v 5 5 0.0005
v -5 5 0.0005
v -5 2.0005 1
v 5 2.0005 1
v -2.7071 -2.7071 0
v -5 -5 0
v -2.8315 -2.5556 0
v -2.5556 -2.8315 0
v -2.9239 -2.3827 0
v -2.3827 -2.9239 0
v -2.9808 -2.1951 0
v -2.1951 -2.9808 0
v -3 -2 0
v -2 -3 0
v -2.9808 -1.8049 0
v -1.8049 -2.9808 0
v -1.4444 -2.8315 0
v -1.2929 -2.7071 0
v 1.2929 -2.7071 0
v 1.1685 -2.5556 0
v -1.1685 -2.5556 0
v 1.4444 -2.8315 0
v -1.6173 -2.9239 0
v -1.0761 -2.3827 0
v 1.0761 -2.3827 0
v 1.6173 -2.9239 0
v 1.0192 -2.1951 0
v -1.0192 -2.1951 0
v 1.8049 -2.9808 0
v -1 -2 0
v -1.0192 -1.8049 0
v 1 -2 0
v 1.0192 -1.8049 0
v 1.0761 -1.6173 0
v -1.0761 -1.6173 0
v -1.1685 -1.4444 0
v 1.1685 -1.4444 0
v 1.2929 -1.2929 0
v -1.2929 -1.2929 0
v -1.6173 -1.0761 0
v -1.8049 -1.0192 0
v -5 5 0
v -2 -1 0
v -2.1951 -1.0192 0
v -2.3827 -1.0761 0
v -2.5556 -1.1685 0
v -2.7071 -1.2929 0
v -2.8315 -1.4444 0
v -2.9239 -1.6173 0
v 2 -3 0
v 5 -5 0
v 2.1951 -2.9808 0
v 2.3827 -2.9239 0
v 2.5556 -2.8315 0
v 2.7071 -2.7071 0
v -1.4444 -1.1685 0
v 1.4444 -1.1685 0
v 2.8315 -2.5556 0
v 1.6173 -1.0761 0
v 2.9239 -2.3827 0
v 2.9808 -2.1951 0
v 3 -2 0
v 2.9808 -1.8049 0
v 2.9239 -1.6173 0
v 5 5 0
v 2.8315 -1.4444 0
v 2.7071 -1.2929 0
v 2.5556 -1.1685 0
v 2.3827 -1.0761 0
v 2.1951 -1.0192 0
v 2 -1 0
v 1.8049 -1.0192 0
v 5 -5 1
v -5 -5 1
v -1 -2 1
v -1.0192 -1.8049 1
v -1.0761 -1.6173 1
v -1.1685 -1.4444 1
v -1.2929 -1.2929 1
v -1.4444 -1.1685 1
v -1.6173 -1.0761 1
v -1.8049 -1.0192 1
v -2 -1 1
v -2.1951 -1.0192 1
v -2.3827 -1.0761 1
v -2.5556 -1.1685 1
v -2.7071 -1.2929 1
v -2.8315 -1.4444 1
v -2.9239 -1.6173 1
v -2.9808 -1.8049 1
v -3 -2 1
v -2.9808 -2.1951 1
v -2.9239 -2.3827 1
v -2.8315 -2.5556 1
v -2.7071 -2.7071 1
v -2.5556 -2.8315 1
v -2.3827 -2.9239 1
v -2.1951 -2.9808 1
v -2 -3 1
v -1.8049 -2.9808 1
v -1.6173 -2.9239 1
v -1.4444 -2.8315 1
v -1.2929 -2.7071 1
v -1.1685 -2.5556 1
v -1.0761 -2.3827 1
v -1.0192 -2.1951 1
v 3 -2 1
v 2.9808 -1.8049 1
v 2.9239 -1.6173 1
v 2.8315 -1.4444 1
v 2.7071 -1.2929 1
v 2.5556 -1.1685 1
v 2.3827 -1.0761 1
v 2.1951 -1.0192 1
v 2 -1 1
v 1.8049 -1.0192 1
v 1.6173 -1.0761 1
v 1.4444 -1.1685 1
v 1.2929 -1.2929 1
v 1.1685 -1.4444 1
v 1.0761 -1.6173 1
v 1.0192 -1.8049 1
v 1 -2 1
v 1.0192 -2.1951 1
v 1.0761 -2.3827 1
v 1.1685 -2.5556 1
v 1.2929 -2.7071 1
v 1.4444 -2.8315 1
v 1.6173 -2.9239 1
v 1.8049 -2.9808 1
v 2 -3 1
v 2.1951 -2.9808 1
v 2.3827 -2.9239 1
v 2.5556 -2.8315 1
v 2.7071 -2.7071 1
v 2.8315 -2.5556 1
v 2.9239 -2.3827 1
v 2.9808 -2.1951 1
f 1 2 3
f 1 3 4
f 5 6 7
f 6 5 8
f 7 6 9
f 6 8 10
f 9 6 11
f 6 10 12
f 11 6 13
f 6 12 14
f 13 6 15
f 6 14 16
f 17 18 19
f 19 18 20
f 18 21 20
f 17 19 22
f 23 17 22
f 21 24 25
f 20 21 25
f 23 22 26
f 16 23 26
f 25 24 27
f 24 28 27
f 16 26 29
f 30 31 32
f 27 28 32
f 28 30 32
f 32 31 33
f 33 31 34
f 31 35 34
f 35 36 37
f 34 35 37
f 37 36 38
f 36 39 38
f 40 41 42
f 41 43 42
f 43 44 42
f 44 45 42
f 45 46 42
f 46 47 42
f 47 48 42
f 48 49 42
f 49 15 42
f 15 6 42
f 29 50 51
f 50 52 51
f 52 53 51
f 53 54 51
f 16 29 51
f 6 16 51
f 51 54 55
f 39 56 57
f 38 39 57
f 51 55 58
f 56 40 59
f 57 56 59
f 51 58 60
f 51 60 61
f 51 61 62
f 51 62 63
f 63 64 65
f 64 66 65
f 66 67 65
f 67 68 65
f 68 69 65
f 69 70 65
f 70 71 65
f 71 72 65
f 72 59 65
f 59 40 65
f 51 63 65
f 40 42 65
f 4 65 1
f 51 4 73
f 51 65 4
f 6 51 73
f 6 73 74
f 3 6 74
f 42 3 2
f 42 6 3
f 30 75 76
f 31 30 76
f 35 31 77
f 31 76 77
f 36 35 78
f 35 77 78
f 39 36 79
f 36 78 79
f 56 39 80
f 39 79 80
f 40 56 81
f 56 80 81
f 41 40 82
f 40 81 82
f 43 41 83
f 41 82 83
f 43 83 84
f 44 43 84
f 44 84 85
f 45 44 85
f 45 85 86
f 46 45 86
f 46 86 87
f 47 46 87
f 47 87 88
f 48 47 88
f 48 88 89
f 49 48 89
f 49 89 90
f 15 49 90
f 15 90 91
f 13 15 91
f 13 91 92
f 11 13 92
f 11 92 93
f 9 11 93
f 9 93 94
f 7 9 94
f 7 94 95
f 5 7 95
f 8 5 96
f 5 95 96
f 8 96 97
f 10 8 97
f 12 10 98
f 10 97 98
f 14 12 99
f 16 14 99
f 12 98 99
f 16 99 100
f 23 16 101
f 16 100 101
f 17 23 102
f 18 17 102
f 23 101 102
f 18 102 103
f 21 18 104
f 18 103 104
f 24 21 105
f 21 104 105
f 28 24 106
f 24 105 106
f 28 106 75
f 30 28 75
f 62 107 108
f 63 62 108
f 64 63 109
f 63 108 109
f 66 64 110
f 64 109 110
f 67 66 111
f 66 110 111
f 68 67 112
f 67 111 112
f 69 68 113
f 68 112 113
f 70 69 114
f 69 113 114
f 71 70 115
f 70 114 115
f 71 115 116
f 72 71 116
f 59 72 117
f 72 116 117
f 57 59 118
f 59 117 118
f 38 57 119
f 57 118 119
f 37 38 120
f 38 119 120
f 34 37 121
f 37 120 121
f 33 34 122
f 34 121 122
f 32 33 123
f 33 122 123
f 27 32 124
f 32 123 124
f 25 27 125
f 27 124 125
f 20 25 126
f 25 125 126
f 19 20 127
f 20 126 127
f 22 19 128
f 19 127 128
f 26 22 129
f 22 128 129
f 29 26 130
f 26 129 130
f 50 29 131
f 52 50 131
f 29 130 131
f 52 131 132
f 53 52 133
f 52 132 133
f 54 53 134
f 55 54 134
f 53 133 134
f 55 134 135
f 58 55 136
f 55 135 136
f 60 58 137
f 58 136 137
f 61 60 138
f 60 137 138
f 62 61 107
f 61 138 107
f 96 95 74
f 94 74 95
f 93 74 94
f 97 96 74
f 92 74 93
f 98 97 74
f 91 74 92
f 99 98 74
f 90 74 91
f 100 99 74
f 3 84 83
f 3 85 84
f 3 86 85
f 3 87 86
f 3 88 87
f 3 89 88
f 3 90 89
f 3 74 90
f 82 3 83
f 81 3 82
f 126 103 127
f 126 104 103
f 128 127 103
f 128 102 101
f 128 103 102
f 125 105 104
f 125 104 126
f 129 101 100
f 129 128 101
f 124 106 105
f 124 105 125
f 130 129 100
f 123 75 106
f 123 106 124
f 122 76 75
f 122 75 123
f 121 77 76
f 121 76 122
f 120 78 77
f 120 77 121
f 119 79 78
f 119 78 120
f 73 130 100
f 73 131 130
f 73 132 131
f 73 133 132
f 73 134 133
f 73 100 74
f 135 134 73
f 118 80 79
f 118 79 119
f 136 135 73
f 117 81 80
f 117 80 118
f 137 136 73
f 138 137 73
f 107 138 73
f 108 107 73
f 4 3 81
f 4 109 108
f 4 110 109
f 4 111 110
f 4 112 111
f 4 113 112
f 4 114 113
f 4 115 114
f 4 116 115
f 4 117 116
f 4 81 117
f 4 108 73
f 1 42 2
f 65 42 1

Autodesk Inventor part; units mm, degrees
ref_plane "YZ Plane" through (0, 0, 0) normal (1, 0, 0) x (0, 1, 0)
ref_plane "XZ Plane" through (0, 0, 0) normal (0, 1, 0) x (-1, 0, 0)
ref_plane "XY Plane" through (0, 0, 0) normal (0, 0, 1) x (1, 0, 0)
sketch "スケッチ1" plane through (0, 0, 0) normal (0, 0, 1) x (1, 0, 0)
  line L0 (5, -5) -> (-5, -5)
  line L1 (-5, -5) -> (-5, 5)
  line L2 (-5, 5) -> (5, 5)
  line L3 (5, 5) -> (5, -5)
  line L4 (5, -5) -> (-5, 5) construction
  line L5 (-5, -5) -> (5, 5) construction
  point P0 (0, 0)
  dimension "d0" = 10
  dimension "d1" = 10
extrude "押し出し1" add sketch "スケッチ1" along normal blind 1
chamfer "面取り1" distance 3 distance2 1 1 edges at (0, 5, 1) measured on face at (-1.6667, 1.6667, 1)
sketch "スケッチ2" plane through (0, 0, 1) normal (0, 0, 1) x (1, 0, 0)
  circle A0 centre (-2, -2) radius 1
  circle A1 centre (2, -2) radius 1
  point P0 (0, 0)
  dimension "d7" = 2
  dimension "d8" = 2
extrude "押し出し2" cut sketch "スケッチ2" against normal blind 1
properties part number "cutter" material "アルミニウム 7075"
